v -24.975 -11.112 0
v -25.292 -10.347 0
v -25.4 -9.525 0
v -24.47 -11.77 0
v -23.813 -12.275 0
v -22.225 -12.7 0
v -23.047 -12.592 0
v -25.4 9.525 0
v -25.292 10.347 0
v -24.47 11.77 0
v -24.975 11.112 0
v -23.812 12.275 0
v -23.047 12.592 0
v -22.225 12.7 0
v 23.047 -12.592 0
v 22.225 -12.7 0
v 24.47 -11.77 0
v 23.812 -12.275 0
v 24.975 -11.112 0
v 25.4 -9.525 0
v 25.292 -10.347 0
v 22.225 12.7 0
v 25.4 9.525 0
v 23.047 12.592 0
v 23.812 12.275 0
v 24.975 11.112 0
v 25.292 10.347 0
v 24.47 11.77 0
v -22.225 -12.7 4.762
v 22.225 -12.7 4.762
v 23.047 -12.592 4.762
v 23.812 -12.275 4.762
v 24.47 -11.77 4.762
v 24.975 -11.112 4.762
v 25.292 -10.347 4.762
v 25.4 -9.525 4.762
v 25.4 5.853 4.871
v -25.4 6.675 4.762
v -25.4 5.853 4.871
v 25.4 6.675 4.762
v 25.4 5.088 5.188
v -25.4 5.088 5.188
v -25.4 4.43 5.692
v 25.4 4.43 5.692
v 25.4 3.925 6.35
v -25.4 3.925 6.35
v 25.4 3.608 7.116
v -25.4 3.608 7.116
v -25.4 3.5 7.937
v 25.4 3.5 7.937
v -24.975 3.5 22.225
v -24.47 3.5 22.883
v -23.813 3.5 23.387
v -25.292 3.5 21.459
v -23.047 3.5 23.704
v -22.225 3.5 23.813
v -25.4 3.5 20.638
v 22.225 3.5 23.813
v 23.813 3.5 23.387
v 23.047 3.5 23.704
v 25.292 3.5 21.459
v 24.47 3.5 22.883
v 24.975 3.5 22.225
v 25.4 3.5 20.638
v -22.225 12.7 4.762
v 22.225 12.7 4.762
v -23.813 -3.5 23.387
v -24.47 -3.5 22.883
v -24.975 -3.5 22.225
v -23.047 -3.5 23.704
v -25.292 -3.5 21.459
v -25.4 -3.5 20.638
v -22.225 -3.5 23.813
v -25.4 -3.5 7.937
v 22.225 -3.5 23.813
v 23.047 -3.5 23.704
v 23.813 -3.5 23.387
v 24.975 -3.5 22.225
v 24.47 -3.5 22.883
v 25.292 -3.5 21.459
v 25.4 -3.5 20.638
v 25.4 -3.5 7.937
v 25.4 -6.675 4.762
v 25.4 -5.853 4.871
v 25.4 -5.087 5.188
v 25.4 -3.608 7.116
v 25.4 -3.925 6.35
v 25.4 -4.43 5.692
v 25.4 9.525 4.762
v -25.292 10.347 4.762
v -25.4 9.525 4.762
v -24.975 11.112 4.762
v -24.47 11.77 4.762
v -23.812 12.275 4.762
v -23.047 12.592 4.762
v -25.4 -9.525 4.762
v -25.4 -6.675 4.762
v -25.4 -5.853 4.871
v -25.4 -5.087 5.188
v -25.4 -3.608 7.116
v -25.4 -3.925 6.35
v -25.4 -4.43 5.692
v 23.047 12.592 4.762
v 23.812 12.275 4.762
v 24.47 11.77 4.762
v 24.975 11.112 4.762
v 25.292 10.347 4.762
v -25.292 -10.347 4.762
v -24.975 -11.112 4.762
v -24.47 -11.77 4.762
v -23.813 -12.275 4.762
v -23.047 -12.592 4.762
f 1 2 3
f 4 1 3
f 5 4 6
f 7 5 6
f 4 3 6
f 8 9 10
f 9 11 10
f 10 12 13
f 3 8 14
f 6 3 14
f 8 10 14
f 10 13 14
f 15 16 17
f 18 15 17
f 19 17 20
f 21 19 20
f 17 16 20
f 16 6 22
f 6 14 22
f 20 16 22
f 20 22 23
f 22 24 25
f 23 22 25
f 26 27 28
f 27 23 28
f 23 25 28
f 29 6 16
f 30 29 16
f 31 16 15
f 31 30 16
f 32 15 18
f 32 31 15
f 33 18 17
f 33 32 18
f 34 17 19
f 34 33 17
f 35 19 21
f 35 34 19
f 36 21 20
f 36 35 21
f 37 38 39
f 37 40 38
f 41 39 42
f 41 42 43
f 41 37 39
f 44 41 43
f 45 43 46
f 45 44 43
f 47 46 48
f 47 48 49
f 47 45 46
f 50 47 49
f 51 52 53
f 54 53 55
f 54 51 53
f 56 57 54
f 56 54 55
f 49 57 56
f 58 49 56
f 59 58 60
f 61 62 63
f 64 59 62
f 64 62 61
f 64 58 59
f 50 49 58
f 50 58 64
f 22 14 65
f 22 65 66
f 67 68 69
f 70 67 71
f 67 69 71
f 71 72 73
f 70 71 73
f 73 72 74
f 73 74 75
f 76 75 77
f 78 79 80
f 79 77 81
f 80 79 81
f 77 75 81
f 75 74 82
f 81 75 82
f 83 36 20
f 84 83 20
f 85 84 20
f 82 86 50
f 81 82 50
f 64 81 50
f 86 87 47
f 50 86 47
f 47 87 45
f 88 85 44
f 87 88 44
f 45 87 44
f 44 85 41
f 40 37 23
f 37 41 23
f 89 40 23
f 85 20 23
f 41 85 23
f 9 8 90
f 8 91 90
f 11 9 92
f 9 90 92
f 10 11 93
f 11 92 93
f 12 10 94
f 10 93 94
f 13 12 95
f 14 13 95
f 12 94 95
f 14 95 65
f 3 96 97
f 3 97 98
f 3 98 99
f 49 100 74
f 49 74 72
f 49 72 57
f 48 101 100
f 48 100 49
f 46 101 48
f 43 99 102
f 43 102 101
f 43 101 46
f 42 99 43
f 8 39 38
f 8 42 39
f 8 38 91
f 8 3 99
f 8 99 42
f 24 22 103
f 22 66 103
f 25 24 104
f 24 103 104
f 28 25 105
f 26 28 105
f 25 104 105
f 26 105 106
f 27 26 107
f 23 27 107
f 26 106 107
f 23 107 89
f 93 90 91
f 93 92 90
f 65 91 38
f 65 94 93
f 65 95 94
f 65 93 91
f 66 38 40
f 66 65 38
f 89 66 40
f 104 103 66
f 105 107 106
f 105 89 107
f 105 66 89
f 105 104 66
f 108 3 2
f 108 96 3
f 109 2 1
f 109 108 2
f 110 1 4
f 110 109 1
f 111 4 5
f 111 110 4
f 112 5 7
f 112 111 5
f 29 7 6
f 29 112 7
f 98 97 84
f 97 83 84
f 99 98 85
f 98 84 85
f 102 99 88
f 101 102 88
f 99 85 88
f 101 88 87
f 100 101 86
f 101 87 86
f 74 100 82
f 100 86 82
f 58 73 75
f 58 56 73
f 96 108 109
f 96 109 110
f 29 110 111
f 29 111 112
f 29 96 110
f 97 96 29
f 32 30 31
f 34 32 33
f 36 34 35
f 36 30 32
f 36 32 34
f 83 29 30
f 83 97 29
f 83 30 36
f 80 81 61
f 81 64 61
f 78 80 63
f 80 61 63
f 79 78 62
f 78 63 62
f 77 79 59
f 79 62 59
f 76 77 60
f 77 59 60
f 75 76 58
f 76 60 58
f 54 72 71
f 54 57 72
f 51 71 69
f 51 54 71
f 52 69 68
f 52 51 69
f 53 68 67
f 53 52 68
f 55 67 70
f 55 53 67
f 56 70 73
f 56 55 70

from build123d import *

# Parameters (mm, degrees)
SKETCH1_W           = 50.8
SKETCH1_H           = 25.4
BOSS_EXTRUDE1_DEPTH = 4.7625
SKETCH2_W           = 50.8
SKETCH2_H           = 7
BOSS_EXTRUDE2_DEPTH = 19.05
FILLET1_R           = 3.175


with BuildPart() as part:
    # Sketch1 → Boss-Extrude1 (new body)
    with BuildSketch(Plane.XY):
        Rectangle(SKETCH1_W, SKETCH1_H)
    extrude(amount=BOSS_EXTRUDE1_DEPTH)

    # Sketch2 → Boss-Extrude2 (add)
    with BuildSketch(Plane.XY.offset(4.7625)):
        Rectangle(SKETCH2_W, SKETCH2_H)
    extrude(amount=BOSS_EXTRUDE2_DEPTH)

    # Fillet1
    fillet1_edges = [part.edges().sort_by_distance(p)[0] for p in [
        (0, 3.5, 4.7625),
        (0, -3.5, 4.7625),
        (25.4, 0, 23.8125),
        (-25.4, 0, 23.8125),
        (25.4, -12.7, 2.38125),
        (-25.4, -12.7, 2.38125),
        (-25.4, 12.7, 2.38125),
        (25.4, 12.7, 2.38125),
    ]]
    fillet(fillet1_edges, radius=FILLET1_R)


solid = part.part
